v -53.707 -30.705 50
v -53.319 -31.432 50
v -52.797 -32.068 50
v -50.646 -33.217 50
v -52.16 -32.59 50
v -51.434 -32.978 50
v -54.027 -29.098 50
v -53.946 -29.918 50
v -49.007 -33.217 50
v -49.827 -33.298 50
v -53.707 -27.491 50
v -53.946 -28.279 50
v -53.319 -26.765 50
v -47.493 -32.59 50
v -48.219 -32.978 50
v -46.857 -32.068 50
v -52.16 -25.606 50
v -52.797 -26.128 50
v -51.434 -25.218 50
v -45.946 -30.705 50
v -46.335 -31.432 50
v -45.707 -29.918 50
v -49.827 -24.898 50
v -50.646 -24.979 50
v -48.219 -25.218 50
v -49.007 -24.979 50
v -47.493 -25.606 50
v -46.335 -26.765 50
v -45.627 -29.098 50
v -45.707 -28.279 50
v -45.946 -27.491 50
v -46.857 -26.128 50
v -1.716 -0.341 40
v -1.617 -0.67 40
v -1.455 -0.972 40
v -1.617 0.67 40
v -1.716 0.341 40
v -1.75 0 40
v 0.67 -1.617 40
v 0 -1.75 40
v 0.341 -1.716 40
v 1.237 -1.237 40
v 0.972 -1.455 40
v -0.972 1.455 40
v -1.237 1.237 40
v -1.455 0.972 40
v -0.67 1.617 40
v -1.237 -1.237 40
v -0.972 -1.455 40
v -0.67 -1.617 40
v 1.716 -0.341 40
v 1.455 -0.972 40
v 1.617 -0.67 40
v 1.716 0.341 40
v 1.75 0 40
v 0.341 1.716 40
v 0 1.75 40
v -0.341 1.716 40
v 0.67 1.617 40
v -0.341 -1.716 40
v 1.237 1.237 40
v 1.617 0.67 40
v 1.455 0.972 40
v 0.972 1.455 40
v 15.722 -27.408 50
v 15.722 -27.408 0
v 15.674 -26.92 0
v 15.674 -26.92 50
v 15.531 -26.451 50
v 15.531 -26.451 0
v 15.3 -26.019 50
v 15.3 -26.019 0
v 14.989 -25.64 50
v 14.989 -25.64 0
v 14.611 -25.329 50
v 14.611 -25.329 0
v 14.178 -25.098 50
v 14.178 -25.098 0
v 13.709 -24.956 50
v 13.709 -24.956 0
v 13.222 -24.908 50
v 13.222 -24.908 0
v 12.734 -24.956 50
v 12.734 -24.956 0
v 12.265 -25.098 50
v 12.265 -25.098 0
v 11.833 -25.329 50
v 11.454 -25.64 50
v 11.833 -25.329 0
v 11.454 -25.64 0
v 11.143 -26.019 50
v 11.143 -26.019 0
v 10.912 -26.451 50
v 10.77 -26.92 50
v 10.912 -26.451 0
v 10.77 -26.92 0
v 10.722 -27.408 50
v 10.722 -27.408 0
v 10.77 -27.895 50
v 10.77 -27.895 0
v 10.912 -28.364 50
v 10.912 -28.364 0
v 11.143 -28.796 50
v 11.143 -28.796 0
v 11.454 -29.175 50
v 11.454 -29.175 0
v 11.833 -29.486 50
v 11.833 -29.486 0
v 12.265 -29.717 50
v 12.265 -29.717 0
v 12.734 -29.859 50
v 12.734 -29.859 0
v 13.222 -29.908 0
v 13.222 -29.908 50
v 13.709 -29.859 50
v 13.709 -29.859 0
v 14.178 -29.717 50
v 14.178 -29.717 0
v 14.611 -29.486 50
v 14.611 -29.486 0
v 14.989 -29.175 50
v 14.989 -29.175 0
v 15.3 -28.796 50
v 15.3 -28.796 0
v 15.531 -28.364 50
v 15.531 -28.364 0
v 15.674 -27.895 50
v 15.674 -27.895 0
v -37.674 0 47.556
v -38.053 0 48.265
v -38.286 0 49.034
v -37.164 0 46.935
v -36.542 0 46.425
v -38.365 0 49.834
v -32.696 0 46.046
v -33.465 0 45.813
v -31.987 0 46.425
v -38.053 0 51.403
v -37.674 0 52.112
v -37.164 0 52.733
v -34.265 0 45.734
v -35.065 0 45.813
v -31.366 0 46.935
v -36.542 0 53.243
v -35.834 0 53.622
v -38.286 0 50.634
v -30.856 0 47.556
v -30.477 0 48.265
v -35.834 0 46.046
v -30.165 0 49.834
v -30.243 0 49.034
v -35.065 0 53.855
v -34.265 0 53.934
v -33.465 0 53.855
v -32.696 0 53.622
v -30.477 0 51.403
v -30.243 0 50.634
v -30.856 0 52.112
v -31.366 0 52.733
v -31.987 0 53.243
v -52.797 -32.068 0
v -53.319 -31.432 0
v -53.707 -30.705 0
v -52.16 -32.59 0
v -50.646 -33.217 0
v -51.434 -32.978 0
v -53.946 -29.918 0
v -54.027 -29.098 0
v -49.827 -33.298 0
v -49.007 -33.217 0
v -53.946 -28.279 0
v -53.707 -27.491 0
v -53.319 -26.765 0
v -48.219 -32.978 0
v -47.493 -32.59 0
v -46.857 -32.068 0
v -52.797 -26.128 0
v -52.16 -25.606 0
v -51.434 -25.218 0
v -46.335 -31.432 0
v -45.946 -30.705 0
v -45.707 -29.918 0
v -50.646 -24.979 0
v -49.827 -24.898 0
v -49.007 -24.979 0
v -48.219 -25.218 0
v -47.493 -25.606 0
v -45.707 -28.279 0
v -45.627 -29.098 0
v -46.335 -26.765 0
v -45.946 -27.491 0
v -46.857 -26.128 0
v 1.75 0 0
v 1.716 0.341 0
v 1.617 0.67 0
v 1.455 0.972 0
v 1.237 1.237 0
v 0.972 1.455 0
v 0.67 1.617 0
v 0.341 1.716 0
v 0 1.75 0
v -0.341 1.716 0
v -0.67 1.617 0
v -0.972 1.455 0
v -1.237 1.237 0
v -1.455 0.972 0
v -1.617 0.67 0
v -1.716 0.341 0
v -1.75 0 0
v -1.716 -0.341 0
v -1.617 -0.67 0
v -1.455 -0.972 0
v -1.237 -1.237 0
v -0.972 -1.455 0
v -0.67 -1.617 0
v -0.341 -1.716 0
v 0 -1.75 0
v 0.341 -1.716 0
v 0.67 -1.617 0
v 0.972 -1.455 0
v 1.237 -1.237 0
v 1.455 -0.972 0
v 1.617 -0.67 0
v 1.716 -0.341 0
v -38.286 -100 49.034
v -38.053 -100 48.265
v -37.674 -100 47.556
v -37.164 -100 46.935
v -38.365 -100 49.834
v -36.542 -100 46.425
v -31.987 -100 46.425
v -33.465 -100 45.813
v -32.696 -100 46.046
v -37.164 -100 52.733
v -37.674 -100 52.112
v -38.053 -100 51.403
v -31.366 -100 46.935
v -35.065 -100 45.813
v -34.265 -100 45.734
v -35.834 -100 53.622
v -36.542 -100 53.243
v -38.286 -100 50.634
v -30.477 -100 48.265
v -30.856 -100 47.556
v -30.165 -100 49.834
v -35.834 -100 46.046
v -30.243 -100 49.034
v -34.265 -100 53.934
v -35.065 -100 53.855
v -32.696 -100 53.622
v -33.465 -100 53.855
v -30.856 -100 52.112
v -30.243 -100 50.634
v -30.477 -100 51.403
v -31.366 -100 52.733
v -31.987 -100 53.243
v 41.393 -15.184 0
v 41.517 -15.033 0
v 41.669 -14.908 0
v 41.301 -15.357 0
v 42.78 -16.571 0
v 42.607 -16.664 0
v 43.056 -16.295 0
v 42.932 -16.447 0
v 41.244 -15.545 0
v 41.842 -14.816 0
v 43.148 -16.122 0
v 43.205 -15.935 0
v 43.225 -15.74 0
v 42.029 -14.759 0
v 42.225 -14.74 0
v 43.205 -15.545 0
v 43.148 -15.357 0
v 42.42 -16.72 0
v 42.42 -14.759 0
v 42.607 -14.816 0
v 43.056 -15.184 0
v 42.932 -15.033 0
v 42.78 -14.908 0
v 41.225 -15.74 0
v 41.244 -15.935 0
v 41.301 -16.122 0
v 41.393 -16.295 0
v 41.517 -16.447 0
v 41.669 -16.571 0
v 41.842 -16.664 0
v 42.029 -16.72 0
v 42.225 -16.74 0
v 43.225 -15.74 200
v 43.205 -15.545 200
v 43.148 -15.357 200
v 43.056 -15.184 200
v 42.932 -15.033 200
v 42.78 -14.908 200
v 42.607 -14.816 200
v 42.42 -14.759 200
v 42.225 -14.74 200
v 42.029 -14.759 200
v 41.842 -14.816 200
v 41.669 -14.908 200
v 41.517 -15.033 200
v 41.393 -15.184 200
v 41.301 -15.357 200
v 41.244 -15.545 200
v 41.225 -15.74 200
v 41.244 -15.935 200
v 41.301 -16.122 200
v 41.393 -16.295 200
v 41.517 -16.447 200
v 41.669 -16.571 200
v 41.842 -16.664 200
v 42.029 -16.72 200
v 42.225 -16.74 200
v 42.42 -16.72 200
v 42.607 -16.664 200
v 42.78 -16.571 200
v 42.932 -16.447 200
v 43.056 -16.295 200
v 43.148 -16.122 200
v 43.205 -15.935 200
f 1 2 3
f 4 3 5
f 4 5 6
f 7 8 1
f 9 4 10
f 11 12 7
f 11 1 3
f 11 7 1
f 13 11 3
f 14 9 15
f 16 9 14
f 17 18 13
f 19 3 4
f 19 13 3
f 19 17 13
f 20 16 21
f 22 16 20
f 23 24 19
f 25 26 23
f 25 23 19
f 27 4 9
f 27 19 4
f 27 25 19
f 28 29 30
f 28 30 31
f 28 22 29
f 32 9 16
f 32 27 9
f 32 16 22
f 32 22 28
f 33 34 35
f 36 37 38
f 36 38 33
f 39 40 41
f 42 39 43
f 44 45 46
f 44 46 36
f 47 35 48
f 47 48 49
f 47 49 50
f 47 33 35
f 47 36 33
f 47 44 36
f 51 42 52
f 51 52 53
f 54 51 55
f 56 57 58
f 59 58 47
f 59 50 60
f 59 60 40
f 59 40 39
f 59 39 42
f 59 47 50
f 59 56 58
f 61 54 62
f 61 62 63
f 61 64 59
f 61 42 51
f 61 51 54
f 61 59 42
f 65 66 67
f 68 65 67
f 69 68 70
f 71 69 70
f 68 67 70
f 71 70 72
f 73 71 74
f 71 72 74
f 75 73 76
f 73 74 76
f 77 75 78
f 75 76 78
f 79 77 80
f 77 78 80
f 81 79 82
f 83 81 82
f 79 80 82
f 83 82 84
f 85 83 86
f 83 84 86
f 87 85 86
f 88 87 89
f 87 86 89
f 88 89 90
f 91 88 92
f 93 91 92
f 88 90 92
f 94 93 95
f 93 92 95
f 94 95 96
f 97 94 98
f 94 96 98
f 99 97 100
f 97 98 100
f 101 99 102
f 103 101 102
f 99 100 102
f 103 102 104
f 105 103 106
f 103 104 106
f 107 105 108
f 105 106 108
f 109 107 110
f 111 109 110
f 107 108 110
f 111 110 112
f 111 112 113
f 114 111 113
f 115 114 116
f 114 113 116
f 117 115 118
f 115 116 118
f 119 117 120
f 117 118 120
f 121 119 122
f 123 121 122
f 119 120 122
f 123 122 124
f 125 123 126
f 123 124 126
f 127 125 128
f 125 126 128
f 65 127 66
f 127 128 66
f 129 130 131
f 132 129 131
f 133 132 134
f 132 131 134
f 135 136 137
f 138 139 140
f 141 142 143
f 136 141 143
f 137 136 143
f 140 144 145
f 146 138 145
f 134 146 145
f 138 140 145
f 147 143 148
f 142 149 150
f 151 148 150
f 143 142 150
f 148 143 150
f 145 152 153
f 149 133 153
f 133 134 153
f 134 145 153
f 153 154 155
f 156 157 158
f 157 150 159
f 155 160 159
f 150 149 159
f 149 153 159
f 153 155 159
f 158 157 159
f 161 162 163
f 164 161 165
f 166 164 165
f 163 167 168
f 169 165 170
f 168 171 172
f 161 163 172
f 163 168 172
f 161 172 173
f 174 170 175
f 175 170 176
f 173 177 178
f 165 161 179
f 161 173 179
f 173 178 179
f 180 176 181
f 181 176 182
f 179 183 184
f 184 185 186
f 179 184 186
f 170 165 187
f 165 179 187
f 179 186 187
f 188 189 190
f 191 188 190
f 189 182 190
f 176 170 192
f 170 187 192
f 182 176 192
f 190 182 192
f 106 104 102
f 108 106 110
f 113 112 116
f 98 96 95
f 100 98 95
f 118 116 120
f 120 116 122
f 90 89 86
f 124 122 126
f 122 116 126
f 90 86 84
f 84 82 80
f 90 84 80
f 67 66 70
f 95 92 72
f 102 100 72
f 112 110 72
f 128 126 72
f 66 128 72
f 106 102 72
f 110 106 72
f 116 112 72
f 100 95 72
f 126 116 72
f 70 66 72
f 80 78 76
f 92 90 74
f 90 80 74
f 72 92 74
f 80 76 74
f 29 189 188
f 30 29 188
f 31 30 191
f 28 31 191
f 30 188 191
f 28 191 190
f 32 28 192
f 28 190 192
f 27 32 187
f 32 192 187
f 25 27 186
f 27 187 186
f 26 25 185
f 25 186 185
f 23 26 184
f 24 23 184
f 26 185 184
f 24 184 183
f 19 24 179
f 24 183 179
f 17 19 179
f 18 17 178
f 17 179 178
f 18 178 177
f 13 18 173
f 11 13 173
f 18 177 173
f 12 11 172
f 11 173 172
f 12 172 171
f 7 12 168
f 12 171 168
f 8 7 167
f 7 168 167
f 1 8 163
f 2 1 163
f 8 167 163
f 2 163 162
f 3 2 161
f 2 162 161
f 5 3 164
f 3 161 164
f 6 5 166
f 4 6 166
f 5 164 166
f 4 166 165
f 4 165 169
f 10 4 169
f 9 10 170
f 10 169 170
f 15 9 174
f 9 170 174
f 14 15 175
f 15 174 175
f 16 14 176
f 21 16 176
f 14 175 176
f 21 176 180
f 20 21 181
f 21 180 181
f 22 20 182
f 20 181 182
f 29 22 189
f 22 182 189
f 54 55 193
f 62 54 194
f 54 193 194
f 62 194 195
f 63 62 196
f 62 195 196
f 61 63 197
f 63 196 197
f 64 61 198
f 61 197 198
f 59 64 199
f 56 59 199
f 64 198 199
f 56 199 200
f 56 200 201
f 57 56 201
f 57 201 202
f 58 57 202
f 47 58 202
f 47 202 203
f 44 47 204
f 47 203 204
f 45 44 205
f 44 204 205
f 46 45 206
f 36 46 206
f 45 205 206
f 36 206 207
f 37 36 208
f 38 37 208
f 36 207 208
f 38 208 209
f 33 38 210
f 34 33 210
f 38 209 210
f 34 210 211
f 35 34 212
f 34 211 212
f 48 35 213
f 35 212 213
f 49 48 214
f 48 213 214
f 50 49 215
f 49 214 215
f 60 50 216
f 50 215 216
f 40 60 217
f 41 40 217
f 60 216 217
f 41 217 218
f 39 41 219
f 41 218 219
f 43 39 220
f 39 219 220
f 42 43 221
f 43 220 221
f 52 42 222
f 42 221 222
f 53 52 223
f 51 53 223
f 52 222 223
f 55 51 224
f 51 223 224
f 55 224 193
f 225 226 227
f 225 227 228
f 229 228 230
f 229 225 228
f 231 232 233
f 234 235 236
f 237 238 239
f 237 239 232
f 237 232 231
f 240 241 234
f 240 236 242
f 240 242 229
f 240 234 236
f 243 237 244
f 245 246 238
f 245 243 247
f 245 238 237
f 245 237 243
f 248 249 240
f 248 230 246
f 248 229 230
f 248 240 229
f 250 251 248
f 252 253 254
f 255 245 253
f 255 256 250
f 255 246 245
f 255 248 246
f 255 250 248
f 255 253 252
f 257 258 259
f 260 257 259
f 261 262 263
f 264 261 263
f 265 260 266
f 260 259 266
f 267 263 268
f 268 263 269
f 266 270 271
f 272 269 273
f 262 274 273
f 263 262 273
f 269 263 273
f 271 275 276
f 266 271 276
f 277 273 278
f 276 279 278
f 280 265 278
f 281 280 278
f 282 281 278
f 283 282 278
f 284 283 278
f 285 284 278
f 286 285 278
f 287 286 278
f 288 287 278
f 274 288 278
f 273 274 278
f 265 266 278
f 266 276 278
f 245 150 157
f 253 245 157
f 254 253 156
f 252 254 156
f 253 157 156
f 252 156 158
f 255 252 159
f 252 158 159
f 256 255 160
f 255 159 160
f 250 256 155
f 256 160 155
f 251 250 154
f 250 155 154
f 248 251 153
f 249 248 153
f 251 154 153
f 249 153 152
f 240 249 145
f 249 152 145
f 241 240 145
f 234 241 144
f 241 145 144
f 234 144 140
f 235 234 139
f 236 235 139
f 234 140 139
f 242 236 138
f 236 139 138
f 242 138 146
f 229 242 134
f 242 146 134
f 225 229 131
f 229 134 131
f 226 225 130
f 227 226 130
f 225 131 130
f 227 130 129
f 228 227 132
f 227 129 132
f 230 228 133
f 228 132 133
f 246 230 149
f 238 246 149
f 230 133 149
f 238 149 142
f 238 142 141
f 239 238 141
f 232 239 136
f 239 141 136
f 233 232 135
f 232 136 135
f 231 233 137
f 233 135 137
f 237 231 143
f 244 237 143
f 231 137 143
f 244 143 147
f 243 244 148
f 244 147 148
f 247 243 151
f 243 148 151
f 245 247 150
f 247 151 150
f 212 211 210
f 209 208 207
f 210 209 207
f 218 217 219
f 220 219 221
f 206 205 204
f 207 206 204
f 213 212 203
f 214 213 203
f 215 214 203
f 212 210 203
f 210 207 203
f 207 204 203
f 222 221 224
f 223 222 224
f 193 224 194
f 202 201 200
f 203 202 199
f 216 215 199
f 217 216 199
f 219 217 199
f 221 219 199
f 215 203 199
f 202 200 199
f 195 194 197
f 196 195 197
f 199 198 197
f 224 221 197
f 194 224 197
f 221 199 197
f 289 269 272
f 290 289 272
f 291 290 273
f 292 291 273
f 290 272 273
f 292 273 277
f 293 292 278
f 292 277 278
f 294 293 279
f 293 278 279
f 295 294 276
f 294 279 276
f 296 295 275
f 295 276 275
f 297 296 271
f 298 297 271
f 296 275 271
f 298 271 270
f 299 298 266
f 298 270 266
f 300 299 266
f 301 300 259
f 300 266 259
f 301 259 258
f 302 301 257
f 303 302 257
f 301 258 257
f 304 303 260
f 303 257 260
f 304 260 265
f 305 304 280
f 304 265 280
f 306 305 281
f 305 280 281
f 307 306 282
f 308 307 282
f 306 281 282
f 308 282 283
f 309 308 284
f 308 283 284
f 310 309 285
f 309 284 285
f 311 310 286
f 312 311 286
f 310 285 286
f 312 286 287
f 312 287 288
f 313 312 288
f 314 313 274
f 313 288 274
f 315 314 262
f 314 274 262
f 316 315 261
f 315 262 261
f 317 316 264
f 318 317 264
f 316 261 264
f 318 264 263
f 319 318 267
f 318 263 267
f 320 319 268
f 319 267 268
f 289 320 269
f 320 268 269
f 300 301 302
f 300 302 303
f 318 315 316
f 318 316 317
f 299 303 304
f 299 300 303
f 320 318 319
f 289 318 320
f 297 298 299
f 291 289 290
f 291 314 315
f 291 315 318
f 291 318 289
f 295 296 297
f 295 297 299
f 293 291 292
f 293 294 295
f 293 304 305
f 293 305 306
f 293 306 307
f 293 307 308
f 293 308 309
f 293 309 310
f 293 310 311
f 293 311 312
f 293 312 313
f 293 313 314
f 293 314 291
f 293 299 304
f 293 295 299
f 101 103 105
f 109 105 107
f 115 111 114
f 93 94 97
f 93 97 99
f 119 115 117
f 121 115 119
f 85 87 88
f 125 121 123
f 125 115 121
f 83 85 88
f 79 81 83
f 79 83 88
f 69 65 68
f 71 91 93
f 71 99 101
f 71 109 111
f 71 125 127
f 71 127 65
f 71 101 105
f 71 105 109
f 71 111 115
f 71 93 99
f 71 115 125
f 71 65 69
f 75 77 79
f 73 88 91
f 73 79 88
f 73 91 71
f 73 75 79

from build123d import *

# Parameters (mm, degrees)
F0_R     = 1.75
F1_DEPTH = 40
F2_R     = 2.5
F3_DEPTH = 50
F4_R     = 4.2
F5_DEPTH = 50
F6_R     = 1
F7_DEPTH = 200
F8_R     = 4.1
F9_DEPTH = 100


with BuildPart() as f1:
    # F0 (on Top) → F1 (new body)
    with BuildSketch(Plane.XY):
        Circle(F0_R)
    extrude(amount=F1_DEPTH)


with BuildPart() as f3:
    # F2 (on Top) → F3 (new body)
    with BuildSketch(Plane.XY):
        with Locations((13.221684, -27.407531)):
            Circle(F2_R)
    extrude(amount=F3_DEPTH)


with BuildPart() as f5:
    # F4 (on Top) → F5 (new body)
    with BuildSketch(Plane.XY):
        with Locations((-49.826756, -29.098148)):
            Circle(F4_R)
    extrude(amount=F5_DEPTH)


with BuildPart() as f7:
    # F6 (on Top) → F7 (new body)
    with BuildSketch(Plane.XY):
        with Locations((42.224582, -15.73967)):
            Circle(F6_R)
    extrude(amount=F7_DEPTH)


with BuildPart() as f9:
    # F8 (on Front) → F9 (new body)
    with BuildSketch(Plane.XZ):
        with Locations((-34.264646, 49.833748)):
            Circle(F8_R)
    extrude(amount=F9_DEPTH)


solid = Compound([f1.part, f3.part, f5.part, f7.part, f9.part])
